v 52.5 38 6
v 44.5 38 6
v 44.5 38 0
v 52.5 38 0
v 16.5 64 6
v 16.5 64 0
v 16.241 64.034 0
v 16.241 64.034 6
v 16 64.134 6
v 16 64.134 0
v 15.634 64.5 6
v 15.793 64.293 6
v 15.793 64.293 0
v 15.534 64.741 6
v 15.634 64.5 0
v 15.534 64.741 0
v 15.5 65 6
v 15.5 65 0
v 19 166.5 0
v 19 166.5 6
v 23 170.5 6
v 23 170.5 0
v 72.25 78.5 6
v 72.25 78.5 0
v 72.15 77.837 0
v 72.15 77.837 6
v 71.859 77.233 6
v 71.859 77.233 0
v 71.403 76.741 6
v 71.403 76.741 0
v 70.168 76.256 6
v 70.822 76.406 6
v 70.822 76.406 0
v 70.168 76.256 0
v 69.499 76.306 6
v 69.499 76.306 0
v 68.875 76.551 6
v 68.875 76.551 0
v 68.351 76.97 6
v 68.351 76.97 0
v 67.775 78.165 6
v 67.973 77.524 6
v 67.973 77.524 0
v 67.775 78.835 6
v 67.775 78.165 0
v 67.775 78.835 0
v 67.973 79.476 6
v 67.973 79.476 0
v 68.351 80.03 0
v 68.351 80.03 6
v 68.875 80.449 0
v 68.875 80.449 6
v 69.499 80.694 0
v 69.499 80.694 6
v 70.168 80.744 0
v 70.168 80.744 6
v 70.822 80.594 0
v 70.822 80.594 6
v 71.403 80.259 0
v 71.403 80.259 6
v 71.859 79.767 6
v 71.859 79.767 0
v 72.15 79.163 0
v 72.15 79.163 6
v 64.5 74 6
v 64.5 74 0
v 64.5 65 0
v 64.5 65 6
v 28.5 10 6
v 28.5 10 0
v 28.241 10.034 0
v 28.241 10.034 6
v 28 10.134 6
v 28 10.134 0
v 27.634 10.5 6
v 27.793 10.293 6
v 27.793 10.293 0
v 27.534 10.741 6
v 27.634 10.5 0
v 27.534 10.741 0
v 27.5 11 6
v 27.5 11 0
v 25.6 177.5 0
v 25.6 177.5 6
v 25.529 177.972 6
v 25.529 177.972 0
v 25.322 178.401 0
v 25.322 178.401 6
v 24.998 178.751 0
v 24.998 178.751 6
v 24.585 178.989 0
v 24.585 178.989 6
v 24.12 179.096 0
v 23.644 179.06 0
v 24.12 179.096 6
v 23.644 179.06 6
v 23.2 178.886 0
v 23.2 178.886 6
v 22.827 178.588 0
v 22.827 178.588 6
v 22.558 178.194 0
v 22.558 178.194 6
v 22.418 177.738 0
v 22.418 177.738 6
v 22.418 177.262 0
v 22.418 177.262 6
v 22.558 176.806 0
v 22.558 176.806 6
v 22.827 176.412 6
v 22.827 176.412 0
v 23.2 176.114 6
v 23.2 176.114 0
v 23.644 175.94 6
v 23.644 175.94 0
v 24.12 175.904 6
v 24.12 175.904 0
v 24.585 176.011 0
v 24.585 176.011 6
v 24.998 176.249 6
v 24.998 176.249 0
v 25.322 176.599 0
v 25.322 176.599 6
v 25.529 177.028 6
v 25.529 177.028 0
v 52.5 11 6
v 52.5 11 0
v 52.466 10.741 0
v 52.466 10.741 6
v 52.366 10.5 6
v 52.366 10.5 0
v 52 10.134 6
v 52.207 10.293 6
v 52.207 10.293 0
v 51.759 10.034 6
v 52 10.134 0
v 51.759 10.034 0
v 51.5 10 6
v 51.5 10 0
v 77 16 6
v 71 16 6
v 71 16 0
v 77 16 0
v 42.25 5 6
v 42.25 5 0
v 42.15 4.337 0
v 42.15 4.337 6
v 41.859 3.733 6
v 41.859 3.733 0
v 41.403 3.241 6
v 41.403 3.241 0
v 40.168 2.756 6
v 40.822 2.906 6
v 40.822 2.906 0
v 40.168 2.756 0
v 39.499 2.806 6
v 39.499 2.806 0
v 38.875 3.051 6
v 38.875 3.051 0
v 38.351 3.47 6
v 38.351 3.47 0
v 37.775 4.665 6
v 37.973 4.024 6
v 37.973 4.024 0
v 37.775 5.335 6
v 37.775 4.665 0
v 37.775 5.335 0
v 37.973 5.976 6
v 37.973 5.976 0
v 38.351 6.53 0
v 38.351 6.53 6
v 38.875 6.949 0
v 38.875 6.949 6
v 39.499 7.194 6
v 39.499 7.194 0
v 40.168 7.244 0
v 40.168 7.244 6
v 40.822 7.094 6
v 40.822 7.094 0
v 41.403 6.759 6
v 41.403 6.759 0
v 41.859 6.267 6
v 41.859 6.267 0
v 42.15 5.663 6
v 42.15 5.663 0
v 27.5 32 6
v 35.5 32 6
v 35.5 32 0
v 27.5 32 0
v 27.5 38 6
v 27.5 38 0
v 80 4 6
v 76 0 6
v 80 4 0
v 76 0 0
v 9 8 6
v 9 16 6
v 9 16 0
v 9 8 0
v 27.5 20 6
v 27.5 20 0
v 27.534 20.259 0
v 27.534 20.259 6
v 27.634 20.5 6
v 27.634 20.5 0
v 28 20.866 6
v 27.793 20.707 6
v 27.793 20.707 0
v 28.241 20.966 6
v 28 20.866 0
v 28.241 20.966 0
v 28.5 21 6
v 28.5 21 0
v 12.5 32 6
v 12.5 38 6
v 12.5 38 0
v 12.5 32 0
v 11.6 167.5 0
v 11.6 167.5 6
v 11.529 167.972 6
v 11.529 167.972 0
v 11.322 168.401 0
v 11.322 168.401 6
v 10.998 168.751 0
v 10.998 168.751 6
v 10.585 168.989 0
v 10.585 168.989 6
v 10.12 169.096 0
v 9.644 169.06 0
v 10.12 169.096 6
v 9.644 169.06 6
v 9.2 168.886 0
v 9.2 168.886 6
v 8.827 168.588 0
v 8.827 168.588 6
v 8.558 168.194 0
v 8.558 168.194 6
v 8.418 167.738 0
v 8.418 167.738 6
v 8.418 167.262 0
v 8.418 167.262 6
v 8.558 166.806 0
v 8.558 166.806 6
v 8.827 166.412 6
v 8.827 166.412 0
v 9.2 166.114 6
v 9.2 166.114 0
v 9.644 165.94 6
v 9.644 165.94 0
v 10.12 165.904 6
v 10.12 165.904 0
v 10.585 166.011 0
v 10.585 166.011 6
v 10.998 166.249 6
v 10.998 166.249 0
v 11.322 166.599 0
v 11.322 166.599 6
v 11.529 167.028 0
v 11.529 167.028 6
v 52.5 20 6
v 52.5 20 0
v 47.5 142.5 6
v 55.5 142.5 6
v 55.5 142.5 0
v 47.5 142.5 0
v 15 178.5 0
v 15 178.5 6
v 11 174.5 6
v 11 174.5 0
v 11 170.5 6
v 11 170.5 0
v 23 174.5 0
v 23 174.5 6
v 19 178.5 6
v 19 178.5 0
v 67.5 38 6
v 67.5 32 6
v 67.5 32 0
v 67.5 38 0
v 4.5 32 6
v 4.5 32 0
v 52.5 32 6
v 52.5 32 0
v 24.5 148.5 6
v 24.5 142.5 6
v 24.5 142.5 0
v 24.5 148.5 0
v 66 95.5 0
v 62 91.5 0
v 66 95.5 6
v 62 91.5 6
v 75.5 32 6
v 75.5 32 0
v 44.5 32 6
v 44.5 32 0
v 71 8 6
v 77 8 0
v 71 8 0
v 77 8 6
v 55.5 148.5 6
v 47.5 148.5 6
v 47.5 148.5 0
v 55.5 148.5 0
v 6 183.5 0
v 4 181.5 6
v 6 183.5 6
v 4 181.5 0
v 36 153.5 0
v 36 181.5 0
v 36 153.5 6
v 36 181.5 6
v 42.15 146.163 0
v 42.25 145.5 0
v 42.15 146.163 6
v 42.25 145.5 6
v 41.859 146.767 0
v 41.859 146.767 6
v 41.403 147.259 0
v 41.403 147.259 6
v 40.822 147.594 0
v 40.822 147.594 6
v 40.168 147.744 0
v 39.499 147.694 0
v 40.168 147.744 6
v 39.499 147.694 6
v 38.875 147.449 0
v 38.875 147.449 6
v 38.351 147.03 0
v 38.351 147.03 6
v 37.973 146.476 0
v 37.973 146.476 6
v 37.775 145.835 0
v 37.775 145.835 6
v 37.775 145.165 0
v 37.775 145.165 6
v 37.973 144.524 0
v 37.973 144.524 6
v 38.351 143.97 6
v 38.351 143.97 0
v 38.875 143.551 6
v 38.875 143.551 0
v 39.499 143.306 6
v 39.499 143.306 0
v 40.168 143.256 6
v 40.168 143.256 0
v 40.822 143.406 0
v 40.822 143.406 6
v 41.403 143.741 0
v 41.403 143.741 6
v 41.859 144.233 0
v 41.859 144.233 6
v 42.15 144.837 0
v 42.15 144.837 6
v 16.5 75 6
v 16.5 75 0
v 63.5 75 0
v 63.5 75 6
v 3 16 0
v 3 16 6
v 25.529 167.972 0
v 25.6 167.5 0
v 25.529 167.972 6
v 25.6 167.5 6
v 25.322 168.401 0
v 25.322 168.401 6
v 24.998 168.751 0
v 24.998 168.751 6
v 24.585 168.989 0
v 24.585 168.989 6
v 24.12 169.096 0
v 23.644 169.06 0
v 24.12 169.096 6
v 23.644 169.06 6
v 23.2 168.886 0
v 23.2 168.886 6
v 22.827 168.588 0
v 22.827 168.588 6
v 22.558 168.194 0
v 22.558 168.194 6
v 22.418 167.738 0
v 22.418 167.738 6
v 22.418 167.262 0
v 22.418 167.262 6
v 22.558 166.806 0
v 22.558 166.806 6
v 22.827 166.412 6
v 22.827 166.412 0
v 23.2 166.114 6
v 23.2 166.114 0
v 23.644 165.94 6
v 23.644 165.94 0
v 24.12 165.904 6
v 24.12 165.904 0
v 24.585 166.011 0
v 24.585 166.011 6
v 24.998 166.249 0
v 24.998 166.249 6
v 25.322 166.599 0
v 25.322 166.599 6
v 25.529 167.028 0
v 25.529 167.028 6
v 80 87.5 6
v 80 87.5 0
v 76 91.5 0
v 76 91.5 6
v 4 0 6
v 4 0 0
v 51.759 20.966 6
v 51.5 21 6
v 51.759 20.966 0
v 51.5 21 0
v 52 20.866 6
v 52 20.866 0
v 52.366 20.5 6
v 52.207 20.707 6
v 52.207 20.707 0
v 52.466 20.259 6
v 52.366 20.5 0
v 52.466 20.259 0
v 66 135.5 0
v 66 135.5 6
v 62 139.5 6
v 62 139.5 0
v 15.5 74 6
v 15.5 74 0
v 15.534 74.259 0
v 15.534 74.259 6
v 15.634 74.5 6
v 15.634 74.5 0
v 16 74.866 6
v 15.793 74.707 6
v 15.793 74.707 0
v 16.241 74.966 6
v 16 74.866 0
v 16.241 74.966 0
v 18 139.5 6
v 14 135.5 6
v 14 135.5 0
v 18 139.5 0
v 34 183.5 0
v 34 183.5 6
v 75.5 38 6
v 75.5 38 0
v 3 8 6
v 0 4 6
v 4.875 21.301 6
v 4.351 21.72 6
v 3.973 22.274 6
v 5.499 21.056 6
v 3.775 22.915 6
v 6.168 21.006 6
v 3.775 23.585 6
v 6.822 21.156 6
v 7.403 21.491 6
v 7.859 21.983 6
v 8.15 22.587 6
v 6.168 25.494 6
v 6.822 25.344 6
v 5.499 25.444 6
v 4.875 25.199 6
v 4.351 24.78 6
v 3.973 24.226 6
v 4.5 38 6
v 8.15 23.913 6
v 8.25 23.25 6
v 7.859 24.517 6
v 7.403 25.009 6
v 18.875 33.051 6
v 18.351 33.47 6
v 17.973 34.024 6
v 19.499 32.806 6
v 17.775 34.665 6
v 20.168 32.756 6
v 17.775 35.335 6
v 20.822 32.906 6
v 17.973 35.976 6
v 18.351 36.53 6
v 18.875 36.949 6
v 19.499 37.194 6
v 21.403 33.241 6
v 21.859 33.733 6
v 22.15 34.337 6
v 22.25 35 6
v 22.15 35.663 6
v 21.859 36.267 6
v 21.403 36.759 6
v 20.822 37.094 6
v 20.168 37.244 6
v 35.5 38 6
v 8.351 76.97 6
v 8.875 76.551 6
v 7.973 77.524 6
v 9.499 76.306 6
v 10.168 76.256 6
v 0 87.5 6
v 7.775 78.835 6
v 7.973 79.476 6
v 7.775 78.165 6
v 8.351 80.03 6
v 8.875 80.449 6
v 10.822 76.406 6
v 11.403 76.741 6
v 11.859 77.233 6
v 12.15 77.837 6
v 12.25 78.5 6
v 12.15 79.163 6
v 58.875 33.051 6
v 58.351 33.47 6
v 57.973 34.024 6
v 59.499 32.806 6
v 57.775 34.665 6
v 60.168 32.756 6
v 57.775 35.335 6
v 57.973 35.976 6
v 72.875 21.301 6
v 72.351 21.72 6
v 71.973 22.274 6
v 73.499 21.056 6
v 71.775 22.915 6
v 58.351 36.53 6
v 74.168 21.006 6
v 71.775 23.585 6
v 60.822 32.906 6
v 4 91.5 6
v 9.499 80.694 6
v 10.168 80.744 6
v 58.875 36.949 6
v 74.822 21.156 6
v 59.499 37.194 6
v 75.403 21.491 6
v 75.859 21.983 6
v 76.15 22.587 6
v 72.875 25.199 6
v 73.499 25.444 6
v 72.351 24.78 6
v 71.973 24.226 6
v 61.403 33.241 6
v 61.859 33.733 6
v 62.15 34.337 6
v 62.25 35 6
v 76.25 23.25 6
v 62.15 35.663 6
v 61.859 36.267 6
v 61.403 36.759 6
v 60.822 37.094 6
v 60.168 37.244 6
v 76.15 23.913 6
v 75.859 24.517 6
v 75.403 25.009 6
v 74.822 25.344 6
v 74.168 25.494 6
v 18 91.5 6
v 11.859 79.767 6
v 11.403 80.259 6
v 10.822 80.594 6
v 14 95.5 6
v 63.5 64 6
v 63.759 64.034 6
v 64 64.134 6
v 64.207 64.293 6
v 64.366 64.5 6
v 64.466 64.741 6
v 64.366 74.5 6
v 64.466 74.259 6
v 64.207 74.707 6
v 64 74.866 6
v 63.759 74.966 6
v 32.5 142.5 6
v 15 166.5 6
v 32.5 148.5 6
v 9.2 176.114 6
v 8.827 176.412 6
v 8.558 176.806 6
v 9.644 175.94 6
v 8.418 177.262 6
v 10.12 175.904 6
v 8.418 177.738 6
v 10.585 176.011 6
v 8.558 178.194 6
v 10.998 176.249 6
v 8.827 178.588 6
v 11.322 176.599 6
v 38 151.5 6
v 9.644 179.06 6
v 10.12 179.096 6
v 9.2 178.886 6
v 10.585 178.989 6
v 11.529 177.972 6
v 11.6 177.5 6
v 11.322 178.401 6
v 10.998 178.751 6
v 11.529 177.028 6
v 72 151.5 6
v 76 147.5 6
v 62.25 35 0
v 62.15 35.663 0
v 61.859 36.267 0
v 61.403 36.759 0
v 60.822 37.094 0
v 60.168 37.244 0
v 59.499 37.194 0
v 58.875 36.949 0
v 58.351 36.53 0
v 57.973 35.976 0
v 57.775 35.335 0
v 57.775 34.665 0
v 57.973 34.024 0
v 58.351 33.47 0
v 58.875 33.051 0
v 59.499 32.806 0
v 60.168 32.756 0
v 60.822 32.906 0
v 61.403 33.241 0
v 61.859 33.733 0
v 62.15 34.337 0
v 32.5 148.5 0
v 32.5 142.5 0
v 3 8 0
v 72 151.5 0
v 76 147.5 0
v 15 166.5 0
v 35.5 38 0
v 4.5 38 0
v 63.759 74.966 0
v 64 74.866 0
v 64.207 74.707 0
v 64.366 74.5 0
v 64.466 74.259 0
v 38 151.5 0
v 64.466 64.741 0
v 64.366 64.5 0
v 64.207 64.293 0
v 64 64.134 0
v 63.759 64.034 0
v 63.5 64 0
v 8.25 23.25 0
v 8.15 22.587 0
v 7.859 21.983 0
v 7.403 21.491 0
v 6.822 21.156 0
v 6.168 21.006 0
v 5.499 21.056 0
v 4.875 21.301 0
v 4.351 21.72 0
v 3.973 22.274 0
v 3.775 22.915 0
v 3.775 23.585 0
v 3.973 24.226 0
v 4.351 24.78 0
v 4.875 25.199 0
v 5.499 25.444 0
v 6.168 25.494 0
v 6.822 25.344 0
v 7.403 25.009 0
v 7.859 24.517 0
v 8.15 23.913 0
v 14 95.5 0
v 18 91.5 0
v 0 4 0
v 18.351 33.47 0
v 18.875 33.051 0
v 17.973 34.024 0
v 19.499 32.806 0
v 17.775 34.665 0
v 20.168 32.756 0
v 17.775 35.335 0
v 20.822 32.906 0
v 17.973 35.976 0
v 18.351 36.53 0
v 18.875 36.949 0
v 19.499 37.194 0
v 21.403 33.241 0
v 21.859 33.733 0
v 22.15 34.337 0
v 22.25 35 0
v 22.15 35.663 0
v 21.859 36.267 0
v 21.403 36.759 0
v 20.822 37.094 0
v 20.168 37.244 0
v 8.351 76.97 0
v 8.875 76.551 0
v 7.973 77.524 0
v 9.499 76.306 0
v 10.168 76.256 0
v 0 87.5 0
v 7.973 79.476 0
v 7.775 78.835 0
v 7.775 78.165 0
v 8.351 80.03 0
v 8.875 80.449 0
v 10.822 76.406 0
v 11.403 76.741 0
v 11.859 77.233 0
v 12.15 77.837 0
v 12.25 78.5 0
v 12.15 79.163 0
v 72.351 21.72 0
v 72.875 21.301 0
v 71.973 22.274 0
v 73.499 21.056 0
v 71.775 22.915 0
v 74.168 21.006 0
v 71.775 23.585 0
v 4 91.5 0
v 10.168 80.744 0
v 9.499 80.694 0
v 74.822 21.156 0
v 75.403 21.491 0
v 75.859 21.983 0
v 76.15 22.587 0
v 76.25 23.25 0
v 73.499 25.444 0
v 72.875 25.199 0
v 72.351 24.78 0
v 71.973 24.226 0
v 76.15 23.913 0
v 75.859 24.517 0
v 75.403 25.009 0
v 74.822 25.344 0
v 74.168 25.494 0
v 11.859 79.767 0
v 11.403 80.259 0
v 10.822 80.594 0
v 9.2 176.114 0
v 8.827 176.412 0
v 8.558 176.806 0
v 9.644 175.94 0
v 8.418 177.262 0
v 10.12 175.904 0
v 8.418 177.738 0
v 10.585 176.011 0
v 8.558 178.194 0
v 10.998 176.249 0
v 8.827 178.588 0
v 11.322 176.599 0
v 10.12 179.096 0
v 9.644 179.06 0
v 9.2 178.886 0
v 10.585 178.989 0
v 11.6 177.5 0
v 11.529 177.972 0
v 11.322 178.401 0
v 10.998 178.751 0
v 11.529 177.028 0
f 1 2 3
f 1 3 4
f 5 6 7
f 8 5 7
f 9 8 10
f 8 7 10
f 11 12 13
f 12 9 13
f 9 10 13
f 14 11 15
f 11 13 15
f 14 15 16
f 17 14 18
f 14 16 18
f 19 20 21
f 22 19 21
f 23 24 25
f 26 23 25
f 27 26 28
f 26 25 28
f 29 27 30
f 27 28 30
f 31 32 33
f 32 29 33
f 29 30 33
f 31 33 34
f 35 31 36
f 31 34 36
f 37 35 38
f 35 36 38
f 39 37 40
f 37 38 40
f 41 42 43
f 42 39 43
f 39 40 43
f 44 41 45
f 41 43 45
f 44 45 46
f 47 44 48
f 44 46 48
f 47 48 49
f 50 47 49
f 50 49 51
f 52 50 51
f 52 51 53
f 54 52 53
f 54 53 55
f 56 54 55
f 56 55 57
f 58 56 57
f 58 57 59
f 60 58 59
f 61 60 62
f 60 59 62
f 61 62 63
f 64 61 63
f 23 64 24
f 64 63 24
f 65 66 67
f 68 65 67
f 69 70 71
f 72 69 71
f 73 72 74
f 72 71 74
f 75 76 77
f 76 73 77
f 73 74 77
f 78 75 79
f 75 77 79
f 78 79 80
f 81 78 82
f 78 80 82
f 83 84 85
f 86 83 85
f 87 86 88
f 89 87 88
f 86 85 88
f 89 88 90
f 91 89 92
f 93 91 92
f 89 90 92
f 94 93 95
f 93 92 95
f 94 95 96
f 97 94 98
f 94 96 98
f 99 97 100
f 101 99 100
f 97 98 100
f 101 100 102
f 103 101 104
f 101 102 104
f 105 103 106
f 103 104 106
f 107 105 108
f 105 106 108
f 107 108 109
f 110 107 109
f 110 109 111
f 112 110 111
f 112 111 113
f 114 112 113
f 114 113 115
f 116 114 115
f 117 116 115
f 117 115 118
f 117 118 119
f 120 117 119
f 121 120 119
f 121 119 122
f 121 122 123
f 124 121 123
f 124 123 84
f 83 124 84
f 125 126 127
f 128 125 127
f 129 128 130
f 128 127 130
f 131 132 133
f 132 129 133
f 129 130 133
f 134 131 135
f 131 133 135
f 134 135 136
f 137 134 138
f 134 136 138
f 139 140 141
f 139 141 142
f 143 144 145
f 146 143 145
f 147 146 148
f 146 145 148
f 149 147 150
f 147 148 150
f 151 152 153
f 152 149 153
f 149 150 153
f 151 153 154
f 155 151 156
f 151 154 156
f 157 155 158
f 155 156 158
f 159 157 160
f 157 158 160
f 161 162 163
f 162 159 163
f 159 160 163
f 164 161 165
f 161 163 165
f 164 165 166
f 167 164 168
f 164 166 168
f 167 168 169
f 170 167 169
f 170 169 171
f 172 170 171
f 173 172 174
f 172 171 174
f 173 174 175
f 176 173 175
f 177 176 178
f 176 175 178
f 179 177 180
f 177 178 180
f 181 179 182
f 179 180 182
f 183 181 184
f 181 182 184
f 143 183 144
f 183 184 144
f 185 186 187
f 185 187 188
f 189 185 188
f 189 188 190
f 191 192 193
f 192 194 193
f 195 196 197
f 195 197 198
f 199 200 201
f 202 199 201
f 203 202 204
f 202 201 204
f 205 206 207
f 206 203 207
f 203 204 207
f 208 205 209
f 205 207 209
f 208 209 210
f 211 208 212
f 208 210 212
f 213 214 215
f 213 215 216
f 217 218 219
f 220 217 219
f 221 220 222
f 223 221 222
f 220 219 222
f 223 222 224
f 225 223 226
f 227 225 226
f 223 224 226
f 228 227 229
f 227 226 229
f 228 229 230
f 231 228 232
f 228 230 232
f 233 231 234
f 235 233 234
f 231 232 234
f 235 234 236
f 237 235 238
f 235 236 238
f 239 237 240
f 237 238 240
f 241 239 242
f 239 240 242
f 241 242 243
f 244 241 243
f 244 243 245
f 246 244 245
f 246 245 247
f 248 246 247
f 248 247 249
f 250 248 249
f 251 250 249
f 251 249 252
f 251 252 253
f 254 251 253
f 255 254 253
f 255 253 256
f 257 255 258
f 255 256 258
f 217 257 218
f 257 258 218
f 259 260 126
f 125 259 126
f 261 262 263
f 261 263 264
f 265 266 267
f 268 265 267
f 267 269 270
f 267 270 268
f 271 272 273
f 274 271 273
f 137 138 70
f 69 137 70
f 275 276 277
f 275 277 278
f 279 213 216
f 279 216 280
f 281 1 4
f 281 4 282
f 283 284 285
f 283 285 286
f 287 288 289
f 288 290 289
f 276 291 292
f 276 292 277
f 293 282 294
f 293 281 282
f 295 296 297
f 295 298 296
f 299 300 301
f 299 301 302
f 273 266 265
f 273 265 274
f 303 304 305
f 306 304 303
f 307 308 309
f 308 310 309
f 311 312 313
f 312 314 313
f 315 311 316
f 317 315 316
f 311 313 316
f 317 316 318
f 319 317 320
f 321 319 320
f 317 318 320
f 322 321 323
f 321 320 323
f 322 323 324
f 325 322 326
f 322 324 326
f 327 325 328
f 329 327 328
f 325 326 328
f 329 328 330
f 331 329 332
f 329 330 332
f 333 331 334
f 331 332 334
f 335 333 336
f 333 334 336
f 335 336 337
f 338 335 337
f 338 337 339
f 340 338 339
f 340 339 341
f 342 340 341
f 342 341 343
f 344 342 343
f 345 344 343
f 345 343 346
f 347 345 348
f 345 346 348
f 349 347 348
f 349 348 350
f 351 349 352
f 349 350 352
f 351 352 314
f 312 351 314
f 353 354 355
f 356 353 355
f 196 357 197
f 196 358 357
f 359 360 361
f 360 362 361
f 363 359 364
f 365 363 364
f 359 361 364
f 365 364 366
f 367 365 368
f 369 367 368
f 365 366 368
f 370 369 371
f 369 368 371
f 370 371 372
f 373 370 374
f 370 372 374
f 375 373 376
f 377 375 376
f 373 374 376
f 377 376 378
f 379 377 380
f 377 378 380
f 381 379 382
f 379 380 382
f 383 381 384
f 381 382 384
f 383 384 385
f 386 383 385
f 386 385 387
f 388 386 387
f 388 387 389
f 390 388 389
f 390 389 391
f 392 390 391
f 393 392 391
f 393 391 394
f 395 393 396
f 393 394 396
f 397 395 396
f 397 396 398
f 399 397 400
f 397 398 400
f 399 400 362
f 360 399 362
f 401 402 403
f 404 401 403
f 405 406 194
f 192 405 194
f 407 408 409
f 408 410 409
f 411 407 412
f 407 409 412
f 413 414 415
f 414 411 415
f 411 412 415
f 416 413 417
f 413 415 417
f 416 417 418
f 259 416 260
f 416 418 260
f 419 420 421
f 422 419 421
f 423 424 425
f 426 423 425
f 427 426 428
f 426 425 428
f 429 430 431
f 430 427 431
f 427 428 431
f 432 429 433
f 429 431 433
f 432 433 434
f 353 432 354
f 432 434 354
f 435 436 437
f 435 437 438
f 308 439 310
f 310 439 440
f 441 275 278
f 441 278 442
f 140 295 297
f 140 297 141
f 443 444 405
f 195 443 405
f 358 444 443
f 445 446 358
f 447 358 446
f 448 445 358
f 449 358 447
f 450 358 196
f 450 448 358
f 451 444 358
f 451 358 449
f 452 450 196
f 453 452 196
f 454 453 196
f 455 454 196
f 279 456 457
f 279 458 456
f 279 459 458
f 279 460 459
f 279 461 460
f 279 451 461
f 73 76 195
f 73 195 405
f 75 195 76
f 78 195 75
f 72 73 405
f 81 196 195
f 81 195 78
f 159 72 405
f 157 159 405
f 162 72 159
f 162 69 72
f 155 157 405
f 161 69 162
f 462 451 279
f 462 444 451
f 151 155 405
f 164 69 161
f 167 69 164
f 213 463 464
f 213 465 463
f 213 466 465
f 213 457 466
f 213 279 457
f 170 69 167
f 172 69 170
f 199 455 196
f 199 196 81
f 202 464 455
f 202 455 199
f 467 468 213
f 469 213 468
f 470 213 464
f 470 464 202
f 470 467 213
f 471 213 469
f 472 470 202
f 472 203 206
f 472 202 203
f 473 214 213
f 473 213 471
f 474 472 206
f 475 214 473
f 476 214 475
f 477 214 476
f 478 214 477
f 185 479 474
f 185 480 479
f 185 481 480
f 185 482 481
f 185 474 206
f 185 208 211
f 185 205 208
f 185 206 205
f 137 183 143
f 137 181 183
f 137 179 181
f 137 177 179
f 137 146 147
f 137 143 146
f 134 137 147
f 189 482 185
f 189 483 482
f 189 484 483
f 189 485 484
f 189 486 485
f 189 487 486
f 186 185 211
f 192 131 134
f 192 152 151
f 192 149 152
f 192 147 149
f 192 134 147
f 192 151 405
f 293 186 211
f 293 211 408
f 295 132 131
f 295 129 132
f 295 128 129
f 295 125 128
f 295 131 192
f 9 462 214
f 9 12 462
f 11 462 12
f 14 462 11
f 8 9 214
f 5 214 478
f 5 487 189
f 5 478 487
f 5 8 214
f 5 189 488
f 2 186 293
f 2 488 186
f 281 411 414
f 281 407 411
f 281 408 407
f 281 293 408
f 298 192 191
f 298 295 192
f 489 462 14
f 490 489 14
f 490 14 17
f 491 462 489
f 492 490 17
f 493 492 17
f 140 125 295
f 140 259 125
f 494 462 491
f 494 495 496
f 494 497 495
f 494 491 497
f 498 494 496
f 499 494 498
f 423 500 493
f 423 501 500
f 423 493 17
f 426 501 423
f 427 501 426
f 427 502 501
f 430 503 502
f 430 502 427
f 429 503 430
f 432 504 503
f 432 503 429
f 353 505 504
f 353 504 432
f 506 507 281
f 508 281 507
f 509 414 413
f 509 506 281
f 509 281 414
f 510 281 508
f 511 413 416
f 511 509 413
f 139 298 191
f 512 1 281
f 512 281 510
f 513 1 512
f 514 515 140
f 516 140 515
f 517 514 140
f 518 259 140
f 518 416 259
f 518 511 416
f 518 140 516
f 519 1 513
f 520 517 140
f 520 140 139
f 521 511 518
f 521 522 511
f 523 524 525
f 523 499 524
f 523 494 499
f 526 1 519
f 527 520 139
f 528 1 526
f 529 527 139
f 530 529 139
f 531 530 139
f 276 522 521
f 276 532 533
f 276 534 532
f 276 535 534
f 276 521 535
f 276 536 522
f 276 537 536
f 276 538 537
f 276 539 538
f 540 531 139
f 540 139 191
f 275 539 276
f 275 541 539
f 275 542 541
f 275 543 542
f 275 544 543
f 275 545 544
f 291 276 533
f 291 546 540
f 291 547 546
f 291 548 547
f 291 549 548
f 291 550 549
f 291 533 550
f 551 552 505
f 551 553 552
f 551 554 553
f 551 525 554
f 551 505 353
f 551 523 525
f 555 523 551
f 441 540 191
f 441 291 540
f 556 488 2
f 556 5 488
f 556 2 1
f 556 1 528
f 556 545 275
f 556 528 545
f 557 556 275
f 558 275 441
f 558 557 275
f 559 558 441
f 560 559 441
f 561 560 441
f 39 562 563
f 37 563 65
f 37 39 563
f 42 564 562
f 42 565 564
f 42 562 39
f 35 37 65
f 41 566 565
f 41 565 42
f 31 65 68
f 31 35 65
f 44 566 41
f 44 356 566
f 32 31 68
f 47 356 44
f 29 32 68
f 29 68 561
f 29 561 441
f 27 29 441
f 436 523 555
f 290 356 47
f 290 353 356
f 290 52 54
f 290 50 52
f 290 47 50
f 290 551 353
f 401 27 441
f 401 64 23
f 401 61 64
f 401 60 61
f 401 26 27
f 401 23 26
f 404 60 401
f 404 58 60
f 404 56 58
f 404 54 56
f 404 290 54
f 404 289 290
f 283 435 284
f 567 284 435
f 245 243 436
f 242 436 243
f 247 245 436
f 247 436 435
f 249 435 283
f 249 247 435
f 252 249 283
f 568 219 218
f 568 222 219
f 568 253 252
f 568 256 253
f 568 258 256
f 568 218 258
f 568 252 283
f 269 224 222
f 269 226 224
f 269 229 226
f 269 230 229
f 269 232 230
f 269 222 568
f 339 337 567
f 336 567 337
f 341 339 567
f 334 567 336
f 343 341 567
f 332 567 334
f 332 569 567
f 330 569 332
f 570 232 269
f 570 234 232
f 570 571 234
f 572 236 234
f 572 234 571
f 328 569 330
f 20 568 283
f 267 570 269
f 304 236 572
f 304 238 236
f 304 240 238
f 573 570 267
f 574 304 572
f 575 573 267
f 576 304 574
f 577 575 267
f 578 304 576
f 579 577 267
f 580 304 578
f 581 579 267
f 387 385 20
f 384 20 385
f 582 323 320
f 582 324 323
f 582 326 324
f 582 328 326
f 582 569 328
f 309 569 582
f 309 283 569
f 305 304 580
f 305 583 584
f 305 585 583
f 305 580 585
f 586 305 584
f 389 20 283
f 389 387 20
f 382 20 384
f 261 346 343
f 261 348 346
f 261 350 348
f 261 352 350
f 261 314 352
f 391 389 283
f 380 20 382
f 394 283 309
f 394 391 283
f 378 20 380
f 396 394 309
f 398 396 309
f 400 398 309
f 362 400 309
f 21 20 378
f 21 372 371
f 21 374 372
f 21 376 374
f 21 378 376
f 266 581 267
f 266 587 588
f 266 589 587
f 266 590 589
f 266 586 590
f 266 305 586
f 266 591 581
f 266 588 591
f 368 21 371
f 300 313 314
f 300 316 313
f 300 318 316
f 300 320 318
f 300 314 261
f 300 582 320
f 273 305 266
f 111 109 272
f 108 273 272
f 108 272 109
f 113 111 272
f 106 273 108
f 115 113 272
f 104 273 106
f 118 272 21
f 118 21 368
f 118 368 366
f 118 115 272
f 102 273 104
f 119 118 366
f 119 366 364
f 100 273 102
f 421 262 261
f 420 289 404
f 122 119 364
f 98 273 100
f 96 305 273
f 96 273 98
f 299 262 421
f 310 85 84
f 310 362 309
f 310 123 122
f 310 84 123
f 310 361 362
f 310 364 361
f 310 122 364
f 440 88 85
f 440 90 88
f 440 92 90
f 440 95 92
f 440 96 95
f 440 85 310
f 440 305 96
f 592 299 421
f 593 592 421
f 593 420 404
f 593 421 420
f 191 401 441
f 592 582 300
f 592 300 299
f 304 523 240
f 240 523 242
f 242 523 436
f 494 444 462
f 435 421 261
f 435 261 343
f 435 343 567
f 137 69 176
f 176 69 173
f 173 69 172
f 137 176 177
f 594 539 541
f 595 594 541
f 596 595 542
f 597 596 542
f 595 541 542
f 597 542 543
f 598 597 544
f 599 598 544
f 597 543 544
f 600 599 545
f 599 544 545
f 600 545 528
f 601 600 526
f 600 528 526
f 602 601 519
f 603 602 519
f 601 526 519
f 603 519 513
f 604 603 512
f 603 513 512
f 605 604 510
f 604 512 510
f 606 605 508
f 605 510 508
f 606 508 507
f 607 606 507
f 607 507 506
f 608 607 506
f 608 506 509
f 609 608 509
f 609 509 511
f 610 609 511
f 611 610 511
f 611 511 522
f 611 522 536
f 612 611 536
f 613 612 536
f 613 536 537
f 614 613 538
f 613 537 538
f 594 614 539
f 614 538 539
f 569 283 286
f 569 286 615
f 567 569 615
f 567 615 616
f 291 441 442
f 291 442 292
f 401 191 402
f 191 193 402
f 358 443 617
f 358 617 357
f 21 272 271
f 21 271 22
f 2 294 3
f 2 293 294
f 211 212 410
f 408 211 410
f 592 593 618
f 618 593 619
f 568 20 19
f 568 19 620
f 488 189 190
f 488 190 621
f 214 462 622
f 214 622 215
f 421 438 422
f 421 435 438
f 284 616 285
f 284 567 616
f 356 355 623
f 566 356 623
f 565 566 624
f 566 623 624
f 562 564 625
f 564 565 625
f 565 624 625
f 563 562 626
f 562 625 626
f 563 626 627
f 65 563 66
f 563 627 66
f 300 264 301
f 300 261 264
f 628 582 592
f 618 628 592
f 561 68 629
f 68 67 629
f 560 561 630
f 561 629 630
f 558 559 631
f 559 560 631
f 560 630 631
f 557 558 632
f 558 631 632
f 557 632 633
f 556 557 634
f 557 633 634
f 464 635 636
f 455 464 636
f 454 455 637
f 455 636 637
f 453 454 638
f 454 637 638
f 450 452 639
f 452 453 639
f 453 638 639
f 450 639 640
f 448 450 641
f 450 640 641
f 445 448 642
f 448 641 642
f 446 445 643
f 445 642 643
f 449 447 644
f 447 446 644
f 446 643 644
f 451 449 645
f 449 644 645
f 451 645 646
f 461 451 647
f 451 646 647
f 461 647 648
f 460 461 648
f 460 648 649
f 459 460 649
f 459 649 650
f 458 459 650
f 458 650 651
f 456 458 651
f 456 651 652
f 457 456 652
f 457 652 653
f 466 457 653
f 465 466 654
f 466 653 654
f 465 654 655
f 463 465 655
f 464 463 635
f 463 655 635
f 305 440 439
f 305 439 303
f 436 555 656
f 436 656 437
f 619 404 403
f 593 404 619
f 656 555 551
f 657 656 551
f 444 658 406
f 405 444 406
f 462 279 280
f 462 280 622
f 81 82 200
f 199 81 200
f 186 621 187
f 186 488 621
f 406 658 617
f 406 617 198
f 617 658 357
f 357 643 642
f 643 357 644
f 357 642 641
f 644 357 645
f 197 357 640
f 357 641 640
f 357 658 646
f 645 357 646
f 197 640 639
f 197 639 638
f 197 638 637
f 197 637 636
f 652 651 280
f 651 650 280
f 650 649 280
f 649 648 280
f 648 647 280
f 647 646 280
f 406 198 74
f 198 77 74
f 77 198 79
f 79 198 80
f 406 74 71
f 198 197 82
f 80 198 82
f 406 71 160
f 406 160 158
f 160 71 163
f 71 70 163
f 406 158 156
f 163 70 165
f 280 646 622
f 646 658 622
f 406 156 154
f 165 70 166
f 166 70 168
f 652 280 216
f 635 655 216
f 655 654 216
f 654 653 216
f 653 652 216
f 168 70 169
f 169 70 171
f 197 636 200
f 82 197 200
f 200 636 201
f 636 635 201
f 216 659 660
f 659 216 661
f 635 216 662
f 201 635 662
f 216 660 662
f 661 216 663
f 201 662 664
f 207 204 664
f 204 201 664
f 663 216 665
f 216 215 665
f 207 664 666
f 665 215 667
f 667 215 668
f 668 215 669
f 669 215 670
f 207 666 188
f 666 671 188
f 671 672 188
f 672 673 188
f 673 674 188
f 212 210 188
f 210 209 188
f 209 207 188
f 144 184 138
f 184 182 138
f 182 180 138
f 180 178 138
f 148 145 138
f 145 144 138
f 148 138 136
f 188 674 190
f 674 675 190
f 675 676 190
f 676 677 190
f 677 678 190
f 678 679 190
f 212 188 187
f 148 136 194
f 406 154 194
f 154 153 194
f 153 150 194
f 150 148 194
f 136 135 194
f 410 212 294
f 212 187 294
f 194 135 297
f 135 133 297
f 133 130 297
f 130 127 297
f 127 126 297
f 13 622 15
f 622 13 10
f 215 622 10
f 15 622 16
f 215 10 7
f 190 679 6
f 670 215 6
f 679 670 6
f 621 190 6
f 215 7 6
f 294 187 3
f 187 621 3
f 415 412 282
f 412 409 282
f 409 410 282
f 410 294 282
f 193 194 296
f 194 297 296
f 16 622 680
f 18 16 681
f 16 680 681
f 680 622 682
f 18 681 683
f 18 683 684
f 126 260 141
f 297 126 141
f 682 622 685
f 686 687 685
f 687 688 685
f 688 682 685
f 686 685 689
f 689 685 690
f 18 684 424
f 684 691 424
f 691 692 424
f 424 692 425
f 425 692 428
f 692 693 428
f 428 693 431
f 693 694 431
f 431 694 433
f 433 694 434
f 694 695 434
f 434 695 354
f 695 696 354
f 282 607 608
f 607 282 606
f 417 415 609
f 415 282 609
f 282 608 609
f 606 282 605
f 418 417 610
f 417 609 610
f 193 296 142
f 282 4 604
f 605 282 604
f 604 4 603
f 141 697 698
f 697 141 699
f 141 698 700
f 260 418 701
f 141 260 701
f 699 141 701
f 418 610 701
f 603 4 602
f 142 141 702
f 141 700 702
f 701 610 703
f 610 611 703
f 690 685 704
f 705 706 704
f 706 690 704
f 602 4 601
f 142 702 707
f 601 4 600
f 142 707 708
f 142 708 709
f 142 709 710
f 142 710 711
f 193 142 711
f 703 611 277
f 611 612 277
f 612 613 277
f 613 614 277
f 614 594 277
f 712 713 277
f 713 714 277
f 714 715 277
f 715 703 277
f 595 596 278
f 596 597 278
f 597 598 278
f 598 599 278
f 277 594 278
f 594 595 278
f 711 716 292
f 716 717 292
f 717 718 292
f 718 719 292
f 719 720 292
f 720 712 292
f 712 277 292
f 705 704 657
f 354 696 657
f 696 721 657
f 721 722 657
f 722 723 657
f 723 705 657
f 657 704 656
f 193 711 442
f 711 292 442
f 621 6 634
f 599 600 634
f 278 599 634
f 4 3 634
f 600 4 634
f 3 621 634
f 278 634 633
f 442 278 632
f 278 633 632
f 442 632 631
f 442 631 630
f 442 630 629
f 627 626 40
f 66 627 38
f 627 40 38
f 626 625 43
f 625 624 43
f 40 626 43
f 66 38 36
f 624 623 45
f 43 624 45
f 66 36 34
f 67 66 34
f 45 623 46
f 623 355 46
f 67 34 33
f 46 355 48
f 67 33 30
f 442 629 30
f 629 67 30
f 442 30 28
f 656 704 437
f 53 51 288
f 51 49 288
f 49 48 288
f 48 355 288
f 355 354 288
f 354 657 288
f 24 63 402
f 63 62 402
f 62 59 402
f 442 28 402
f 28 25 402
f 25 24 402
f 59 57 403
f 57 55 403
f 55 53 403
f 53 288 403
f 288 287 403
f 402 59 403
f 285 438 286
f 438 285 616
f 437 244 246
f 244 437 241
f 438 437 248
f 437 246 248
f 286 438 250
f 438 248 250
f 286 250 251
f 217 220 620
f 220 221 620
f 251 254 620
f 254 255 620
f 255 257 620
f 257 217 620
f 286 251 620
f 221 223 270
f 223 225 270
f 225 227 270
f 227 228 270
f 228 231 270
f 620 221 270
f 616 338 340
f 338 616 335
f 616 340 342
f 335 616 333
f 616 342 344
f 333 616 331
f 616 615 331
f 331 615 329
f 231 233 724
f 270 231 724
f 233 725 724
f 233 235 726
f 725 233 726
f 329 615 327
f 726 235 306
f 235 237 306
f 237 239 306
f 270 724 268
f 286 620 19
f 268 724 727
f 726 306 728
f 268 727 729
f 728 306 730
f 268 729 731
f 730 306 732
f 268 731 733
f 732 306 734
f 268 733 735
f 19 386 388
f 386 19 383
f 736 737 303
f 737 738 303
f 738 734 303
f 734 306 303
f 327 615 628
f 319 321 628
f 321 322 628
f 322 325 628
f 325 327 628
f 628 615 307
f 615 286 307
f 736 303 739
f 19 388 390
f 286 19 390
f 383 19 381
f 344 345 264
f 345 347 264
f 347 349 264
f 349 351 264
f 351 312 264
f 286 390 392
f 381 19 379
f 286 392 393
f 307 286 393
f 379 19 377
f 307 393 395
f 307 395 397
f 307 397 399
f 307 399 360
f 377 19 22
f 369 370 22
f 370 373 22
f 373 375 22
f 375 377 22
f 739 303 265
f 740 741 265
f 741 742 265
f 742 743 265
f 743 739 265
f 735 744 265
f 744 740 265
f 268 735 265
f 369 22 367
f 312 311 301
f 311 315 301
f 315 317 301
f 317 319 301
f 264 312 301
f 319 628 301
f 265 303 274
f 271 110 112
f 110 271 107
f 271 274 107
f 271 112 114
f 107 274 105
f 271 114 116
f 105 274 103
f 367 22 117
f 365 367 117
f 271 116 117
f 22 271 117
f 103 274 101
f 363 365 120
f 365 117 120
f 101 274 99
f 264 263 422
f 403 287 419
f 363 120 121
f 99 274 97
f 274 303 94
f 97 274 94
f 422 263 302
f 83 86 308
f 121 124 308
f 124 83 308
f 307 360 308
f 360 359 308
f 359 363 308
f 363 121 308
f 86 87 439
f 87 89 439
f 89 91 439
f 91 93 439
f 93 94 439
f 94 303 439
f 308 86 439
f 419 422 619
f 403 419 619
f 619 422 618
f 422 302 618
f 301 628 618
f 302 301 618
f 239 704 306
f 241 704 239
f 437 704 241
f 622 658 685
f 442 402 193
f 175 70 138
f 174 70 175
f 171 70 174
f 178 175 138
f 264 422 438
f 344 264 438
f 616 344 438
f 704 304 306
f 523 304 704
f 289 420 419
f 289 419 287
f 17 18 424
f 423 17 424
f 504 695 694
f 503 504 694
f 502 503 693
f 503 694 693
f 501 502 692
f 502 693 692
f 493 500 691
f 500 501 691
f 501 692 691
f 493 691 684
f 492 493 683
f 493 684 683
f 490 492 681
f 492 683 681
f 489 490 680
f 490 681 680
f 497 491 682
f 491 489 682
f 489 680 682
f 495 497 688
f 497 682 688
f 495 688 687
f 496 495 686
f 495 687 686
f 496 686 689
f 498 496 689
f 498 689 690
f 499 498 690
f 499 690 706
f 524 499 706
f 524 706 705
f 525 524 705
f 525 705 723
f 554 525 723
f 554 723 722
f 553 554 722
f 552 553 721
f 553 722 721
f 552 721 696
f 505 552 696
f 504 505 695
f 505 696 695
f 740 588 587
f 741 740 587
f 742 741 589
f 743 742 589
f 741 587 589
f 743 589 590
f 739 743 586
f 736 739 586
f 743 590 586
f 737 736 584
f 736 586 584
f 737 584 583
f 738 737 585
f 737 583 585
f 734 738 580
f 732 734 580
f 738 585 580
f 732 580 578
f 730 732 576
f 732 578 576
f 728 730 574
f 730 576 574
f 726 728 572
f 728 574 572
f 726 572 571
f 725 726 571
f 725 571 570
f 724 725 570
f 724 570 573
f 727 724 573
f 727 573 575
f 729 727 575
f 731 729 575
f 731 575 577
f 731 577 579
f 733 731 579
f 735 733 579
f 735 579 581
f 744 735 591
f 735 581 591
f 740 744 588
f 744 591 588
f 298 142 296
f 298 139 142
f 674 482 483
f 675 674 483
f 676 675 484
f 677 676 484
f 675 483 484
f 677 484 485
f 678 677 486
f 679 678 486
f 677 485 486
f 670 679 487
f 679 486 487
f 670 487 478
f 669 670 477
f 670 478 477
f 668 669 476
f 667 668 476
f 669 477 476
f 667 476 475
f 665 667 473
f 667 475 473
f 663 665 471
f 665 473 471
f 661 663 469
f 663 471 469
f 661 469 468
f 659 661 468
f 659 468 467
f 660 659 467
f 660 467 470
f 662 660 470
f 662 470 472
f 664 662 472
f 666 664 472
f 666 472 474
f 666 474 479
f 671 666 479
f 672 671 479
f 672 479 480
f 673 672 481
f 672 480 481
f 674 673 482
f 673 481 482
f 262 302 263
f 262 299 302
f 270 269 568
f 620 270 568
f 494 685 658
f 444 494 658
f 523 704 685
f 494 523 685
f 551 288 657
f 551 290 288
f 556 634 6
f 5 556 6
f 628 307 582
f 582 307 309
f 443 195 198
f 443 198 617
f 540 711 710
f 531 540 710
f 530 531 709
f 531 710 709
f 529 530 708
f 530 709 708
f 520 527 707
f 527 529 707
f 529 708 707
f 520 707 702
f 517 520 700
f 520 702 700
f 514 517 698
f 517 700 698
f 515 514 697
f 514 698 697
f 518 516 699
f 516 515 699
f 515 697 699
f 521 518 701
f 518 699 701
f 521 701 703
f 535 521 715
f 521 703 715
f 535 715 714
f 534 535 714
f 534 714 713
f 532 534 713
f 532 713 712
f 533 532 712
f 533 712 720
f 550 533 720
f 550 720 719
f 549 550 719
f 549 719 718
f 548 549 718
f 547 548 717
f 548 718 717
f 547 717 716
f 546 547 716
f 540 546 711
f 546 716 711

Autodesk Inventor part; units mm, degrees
ref_plane "YZ Plane" through (0, 0, 0) normal (1, 0, 0) x (0, 1, 0)
ref_plane "XZ Plane" through (0, 0, 0) normal (0, 1, 0) x (-1, 0, 0)
ref_plane "XY Plane" through (0, 0, 0) normal (0, 0, 1) x (1, 0, 0)
sketch "Sketch1" plane through (0, 0, 0) normal (0, 0, 1) x (1, 0, 0)
  line L0 (4, 0) -> (76, 0)
  line L1 (80, 4) -> (80, 87.5)
  line L2 (76, 91.5) -> (4, 91.5)
  line L3 (0, 87.5) -> (0, 4)
  line L4 (0, 4) -> (4, 0)
  line L5 (76, 0) -> (80, 4)
  line L6 (80, 87.5) -> (76, 91.5)
  line L7 (4, 91.5) -> (0, 87.5)
  line L8 (16.5, 75) -> (63.5, 75)
  line L9 (64.5, 74) -> (64.5, 65)
  line L10 (63.5, 64) -> (16.5, 64)
  line L11 (15.5, 65) -> (15.5, 74)
  arc A0 (15.5, 65) -> (16.5, 64) centre (16.5, 65) ccw
  arc A1 (16.5, 75) -> (15.5, 74) centre (16.5, 74) ccw
  arc A2 (64.5, 74) -> (63.5, 75) centre (63.5, 74) ccw
  arc A3 (63.5, 64) -> (64.5, 65) centre (63.5, 65) ccw
  line L12 (28.5, 21) -> (51.5, 21)
  line L13 (52.5, 20) -> (52.5, 11)
  line L14 (51.5, 10) -> (28.5, 10)
  line L15 (27.5, 11) -> (27.5, 20)
  arc A4 (27.5, 11) -> (28.5, 10) centre (28.5, 11) ccw
  arc A5 (28.5, 21) -> (27.5, 20) centre (28.5, 20) ccw
  arc A6 (52.5, 20) -> (51.5, 21) centre (51.5, 20) ccw
  arc A7 (51.5, 10) -> (52.5, 11) centre (51.5, 11) ccw
  line L16 (15.5, 69.5) -> (64.5, 69.5) construction
  line L17 (27.5, 15.5) -> (52.5, 15.5) construction
  circle A8 centre (40, 5) radius 2.25
  circle A9 centre (10, 78.5) radius 2.25
  circle A10 centre (6, 23.25) radius 2.25
  circle A11 centre (74, 23.25) radius 2.25
  circle A12 centre (70, 78.5) radius 2.25
  point P0 (0, 0)
  point P1 (40, 64)
  point P2 (40, 21)
  point P3 (40, 75)
  point P4 (40, 91.5)
  point P5 (0, 45.75)
  point P6 (80, 45.75)
  dimension "d0" = 45
  dimension "d1" = 4
  dimension "d2" = 1
  dimension "d3" = 11
  dimension "d4" = 49
  dimension "d5" = 1
  dimension "d6" = 11
  dimension "d7" = 25
  dimension "d9" = 10
  dimension "d10" = 16.5
  dimension "d11" = 4.5
  dimension "d12" = 4.5
  dimension "d13" = 5
  dimension "d15" = 4.5
  dimension "d16" = 4.5
  dimension "d19" = 54
  dimension "d22" = 80
  dimension "d23" = 6
  dimension "d24" = 6
  dimension "d25" = 23.25
  dimension "d26" = 4.5
  dimension "d27" = 10
  dimension "d28" = 10
  dimension "d54" = 3.5
extrude "Extrusion2" add sketch "Sketch1" along normal blind 6
sketch "Sketch2" plane through (0, 0, 6) normal (0, 0, 1) x (1, 0, 0)
  line L0 (4, 0) -> (76, 0) projected
  circle A0 centre (20, 35) radius 2.25
  circle A1 centre (60, 35) radius 2.25
  line L1 (20, 35) -> (60, 35) construction
  point P0 (0, 0)
  point P1 (40, 35)
  point P2 (40, 0)
  dimension "d31" = 4.5
  dimension "d32" = 4.5
  dimension "d33" = 40
  dimension "d34" = 35
extrude "Extrusion3" cut sketch "Sketch2" against normal through all
sketch "Sketch3" plane through (0, 0, 6) normal (0, 0, 1) x (1, 0, 0)
  circle A0 centre (20, 35) radius 2.25 projected
  circle A1 centre (60, 35) radius 2.25 projected
  line L0 (80, 4) -> (80, 87.5) projected
  line L1 (0, 87.5) -> (0, 4) projected
  line L2 (27.5, 38) -> (35.5, 38)
  line L3 (35.5, 38) -> (35.5, 32)
  line L4 (35.5, 32) -> (27.5, 32)
  line L5 (27.5, 32) -> (27.5, 38)
  line L6 (44.5, 38) -> (52.5, 38)
  line L7 (52.5, 38) -> (52.5, 32)
  line L8 (52.5, 32) -> (44.5, 32)
  line L9 (44.5, 32) -> (44.5, 38)
  line L10 (67.5, 38) -> (75.5, 38)
  line L11 (75.5, 38) -> (75.5, 32)
  line L12 (75.5, 32) -> (67.5, 32)
  line L13 (67.5, 32) -> (67.5, 38)
  line L14 (4.5, 38) -> (12.5, 38)
  line L15 (12.5, 38) -> (12.5, 32)
  line L16 (12.5, 32) -> (4.5, 32)
  line L17 (4.5, 32) -> (4.5, 38)
  line L18 (3, 16) -> (9, 16)
  line L19 (9, 16) -> (9, 8)
  line L20 (9, 8) -> (3, 8)
  line L21 (3, 8) -> (3, 16)
  line L22 (71, 16) -> (77, 16)
  line L23 (77, 16) -> (77, 8)
  line L24 (77, 8) -> (71, 8)
  line L25 (71, 8) -> (71, 16)
  point P0 (0, 0)
  point P1 (12.5, 35)
  dimension "d37" = 6
  dimension "d38" = 8
  dimension "d39" = 8
  dimension "d40" = 8
  dimension "d41" = 8
  dimension "d42" = 6
  dimension "d43" = 8
  dimension "d44" = 6
  dimension "d45" = 3
  dimension "d46" = 3
  dimension "d47" = 4
  dimension "d48" = 15
  dimension "d49" = 15
  dimension "d50" = 7.5
  dimension "d51" = 7.5
extrude "Extrusion4" cut sketch "Sketch3" against normal through all contours L2 L3 L4 L5 | L6 L7 L8 L9 | L10 L11 L12 L13 | L14 L15 L16 L17 | L18 L19 L20 L21 | L22 L23 L24 L25
sketch "Sketch4" plane through (0, 0, 6) normal (0, 0, 1) x (1, 0, 0)
  line L0 (4, 91.5) -> (76, 91.5)
  line L1 (76, 91.5) -> (76, 151.5)
  line L2 (36, 183.5) -> (4, 183.5)
  line L3 (4, 183.5) -> (4, 91.5)
  line L4 (36, 183.5) -> (36, 151.5)
  line L5 (36, 151.5) -> (76, 151.5)
  point P0 (0, 0)
  dimension "d55" = 92
  dimension "d57" = 32
  dimension "d58" = 32
extrude "Extrusion5" add sketch "Sketch4" against normal blind 6
chamfer "Chamfer1" distance 4 angle 45 1 edges at (76, 151.5, 3)
chamfer "Chamfer2" distance 2 angle 45 3 edges at (36, 151.5, 3) (36, 183.5, 3) (4, 183.5, 3)
sketch "Sketch5" plane through (0, 0, 6) normal (0, 0, 1) x (1, 0, 0)
  line L0 (4, 181.5) -> (4, 91.5) projected
  line L1 (34, 183.5) -> (6, 183.5) projected
  line L2 (10, 177.5) -> (24, 177.5) construction
  line L3 (24, 177.5) -> (24, 167.5) construction
  line L4 (24, 167.5) -> (10, 167.5) construction
  line L5 (10, 167.5) -> (10, 177.5) construction
  line L6 (15, 178.5) -> (19, 178.5)
  line L7 (23, 174.5) -> (23, 170.5)
  line L8 (19, 166.5) -> (15, 166.5)
  line L9 (11, 170.5) -> (11, 174.5)
  line L10 (11, 170.5) -> (15, 166.5)
  line L11 (19, 166.5) -> (23, 170.5)
  line L12 (23, 174.5) -> (19, 178.5)
  line L13 (15, 178.5) -> (11, 174.5)
  circle A0 centre (10, 177.5) radius 1.6
  circle A1 centre (10, 167.5) radius 1.6
  circle A2 centre (24, 167.5) radius 1.6
  circle A3 centre (24, 177.5) radius 1.6
  point P0 (0, 0)
  point P1 (23, 172.5)
  point P2 (24, 172.5)
  dimension "d67" = 45
  dimension "d68" = 4
  dimension "d69" = 3.2
  dimension "d70" = 14
  dimension "d71" = 10
  dimension "d72" = 1
  dimension "d73" = 1
  dimension "d74" = 6
  dimension "d75" = 6
extrude "Extrusion6" cut sketch "Sketch5" against normal through all
sketch "Sketch6" plane through (0, 0, 6) normal (0, 0, 1) x (1, 0, 0)
  line L0 (72, 151.5) -> (38, 151.5) projected
  line L1 (16.5, 75) -> (63.5, 75) projected
  line L2 (24.5, 148.5) -> (32.5, 148.5)
  line L3 (32.5, 148.5) -> (32.5, 142.5)
  line L4 (32.5, 142.5) -> (24.5, 142.5)
  line L5 (24.5, 142.5) -> (24.5, 148.5)
  line L6 (47.5, 148.5) -> (55.5, 148.5)
  line L7 (55.5, 148.5) -> (55.5, 142.5)
  line L8 (55.5, 142.5) -> (47.5, 142.5)
  line L9 (47.5, 142.5) -> (47.5, 148.5)
  line L10 (32.5, 148.5) -> (47.5, 142.5) construction
  line L11 (47.5, 148.5) -> (32.5, 142.5) construction
  circle A0 centre (40, 145.5) radius 2.25
  point P0 (0, 0)
  point P1 (40, 75)
  dimension "d78" = 6
  dimension "d79" = 8
  dimension "d80" = 8
  dimension "d81" = 15
  dimension "d82" = 4.5
  dimension "d83" = 3
extrude "Extrusion7" cut sketch "Sketch6" against normal through all
sketch "Sketch7" plane through (0, 0, 6) normal (0, 0, 1) x (1, 0, 0)
  line L0 (32.5, 142.5) -> (24.5, 142.5) projected
  line L1 (4, 181.5) -> (4, 91.5) projected
  line L2 (76, 91.5) -> (76, 147.5) projected
  line L3 (18, 139.5) -> (62, 139.5)
  line L4 (66, 135.5) -> (66, 95.5)
  line L5 (62, 91.5) -> (18, 91.5)
  line L6 (14, 95.5) -> (14, 135.5)
  line L7 (14, 135.5) -> (18, 139.5)
  line L8 (14, 95.5) -> (18, 91.5)
  line L9 (62, 91.5) -> (66, 95.5)
  line L10 (66, 135.5) -> (62, 139.5)
  point P0 (0, 0)
  point P1 (14, 139.5)
  point P2 (66, 91.5)
  point P3 (66, 139.5)
  point P4 (14, 91.5)
  dimension "d86" = 4
  dimension "d87" = 4
  dimension "d88" = 4
  dimension "d89" = 4
  dimension "d90" = 4
  dimension "d91" = 4
  dimension "d92" = 4
  dimension "d93" = 4
  dimension "d94" = 10
  dimension "d95" = 10
  dimension "d96" = 3
extrude "Extrusion8" cut sketch "Sketch7" against normal through all
equation "\"d87\" = d86"
equation "\"d88\" = d86"
equation "\"d89\" = d88"
equation "\"d90\" = d86"
equation "\"d91\" = d90"
equation "\"d92\" = d86"
equation "\"d93\" = d92"
equation "\"d95\" = d94"
properties part number "x_carriage_front"
